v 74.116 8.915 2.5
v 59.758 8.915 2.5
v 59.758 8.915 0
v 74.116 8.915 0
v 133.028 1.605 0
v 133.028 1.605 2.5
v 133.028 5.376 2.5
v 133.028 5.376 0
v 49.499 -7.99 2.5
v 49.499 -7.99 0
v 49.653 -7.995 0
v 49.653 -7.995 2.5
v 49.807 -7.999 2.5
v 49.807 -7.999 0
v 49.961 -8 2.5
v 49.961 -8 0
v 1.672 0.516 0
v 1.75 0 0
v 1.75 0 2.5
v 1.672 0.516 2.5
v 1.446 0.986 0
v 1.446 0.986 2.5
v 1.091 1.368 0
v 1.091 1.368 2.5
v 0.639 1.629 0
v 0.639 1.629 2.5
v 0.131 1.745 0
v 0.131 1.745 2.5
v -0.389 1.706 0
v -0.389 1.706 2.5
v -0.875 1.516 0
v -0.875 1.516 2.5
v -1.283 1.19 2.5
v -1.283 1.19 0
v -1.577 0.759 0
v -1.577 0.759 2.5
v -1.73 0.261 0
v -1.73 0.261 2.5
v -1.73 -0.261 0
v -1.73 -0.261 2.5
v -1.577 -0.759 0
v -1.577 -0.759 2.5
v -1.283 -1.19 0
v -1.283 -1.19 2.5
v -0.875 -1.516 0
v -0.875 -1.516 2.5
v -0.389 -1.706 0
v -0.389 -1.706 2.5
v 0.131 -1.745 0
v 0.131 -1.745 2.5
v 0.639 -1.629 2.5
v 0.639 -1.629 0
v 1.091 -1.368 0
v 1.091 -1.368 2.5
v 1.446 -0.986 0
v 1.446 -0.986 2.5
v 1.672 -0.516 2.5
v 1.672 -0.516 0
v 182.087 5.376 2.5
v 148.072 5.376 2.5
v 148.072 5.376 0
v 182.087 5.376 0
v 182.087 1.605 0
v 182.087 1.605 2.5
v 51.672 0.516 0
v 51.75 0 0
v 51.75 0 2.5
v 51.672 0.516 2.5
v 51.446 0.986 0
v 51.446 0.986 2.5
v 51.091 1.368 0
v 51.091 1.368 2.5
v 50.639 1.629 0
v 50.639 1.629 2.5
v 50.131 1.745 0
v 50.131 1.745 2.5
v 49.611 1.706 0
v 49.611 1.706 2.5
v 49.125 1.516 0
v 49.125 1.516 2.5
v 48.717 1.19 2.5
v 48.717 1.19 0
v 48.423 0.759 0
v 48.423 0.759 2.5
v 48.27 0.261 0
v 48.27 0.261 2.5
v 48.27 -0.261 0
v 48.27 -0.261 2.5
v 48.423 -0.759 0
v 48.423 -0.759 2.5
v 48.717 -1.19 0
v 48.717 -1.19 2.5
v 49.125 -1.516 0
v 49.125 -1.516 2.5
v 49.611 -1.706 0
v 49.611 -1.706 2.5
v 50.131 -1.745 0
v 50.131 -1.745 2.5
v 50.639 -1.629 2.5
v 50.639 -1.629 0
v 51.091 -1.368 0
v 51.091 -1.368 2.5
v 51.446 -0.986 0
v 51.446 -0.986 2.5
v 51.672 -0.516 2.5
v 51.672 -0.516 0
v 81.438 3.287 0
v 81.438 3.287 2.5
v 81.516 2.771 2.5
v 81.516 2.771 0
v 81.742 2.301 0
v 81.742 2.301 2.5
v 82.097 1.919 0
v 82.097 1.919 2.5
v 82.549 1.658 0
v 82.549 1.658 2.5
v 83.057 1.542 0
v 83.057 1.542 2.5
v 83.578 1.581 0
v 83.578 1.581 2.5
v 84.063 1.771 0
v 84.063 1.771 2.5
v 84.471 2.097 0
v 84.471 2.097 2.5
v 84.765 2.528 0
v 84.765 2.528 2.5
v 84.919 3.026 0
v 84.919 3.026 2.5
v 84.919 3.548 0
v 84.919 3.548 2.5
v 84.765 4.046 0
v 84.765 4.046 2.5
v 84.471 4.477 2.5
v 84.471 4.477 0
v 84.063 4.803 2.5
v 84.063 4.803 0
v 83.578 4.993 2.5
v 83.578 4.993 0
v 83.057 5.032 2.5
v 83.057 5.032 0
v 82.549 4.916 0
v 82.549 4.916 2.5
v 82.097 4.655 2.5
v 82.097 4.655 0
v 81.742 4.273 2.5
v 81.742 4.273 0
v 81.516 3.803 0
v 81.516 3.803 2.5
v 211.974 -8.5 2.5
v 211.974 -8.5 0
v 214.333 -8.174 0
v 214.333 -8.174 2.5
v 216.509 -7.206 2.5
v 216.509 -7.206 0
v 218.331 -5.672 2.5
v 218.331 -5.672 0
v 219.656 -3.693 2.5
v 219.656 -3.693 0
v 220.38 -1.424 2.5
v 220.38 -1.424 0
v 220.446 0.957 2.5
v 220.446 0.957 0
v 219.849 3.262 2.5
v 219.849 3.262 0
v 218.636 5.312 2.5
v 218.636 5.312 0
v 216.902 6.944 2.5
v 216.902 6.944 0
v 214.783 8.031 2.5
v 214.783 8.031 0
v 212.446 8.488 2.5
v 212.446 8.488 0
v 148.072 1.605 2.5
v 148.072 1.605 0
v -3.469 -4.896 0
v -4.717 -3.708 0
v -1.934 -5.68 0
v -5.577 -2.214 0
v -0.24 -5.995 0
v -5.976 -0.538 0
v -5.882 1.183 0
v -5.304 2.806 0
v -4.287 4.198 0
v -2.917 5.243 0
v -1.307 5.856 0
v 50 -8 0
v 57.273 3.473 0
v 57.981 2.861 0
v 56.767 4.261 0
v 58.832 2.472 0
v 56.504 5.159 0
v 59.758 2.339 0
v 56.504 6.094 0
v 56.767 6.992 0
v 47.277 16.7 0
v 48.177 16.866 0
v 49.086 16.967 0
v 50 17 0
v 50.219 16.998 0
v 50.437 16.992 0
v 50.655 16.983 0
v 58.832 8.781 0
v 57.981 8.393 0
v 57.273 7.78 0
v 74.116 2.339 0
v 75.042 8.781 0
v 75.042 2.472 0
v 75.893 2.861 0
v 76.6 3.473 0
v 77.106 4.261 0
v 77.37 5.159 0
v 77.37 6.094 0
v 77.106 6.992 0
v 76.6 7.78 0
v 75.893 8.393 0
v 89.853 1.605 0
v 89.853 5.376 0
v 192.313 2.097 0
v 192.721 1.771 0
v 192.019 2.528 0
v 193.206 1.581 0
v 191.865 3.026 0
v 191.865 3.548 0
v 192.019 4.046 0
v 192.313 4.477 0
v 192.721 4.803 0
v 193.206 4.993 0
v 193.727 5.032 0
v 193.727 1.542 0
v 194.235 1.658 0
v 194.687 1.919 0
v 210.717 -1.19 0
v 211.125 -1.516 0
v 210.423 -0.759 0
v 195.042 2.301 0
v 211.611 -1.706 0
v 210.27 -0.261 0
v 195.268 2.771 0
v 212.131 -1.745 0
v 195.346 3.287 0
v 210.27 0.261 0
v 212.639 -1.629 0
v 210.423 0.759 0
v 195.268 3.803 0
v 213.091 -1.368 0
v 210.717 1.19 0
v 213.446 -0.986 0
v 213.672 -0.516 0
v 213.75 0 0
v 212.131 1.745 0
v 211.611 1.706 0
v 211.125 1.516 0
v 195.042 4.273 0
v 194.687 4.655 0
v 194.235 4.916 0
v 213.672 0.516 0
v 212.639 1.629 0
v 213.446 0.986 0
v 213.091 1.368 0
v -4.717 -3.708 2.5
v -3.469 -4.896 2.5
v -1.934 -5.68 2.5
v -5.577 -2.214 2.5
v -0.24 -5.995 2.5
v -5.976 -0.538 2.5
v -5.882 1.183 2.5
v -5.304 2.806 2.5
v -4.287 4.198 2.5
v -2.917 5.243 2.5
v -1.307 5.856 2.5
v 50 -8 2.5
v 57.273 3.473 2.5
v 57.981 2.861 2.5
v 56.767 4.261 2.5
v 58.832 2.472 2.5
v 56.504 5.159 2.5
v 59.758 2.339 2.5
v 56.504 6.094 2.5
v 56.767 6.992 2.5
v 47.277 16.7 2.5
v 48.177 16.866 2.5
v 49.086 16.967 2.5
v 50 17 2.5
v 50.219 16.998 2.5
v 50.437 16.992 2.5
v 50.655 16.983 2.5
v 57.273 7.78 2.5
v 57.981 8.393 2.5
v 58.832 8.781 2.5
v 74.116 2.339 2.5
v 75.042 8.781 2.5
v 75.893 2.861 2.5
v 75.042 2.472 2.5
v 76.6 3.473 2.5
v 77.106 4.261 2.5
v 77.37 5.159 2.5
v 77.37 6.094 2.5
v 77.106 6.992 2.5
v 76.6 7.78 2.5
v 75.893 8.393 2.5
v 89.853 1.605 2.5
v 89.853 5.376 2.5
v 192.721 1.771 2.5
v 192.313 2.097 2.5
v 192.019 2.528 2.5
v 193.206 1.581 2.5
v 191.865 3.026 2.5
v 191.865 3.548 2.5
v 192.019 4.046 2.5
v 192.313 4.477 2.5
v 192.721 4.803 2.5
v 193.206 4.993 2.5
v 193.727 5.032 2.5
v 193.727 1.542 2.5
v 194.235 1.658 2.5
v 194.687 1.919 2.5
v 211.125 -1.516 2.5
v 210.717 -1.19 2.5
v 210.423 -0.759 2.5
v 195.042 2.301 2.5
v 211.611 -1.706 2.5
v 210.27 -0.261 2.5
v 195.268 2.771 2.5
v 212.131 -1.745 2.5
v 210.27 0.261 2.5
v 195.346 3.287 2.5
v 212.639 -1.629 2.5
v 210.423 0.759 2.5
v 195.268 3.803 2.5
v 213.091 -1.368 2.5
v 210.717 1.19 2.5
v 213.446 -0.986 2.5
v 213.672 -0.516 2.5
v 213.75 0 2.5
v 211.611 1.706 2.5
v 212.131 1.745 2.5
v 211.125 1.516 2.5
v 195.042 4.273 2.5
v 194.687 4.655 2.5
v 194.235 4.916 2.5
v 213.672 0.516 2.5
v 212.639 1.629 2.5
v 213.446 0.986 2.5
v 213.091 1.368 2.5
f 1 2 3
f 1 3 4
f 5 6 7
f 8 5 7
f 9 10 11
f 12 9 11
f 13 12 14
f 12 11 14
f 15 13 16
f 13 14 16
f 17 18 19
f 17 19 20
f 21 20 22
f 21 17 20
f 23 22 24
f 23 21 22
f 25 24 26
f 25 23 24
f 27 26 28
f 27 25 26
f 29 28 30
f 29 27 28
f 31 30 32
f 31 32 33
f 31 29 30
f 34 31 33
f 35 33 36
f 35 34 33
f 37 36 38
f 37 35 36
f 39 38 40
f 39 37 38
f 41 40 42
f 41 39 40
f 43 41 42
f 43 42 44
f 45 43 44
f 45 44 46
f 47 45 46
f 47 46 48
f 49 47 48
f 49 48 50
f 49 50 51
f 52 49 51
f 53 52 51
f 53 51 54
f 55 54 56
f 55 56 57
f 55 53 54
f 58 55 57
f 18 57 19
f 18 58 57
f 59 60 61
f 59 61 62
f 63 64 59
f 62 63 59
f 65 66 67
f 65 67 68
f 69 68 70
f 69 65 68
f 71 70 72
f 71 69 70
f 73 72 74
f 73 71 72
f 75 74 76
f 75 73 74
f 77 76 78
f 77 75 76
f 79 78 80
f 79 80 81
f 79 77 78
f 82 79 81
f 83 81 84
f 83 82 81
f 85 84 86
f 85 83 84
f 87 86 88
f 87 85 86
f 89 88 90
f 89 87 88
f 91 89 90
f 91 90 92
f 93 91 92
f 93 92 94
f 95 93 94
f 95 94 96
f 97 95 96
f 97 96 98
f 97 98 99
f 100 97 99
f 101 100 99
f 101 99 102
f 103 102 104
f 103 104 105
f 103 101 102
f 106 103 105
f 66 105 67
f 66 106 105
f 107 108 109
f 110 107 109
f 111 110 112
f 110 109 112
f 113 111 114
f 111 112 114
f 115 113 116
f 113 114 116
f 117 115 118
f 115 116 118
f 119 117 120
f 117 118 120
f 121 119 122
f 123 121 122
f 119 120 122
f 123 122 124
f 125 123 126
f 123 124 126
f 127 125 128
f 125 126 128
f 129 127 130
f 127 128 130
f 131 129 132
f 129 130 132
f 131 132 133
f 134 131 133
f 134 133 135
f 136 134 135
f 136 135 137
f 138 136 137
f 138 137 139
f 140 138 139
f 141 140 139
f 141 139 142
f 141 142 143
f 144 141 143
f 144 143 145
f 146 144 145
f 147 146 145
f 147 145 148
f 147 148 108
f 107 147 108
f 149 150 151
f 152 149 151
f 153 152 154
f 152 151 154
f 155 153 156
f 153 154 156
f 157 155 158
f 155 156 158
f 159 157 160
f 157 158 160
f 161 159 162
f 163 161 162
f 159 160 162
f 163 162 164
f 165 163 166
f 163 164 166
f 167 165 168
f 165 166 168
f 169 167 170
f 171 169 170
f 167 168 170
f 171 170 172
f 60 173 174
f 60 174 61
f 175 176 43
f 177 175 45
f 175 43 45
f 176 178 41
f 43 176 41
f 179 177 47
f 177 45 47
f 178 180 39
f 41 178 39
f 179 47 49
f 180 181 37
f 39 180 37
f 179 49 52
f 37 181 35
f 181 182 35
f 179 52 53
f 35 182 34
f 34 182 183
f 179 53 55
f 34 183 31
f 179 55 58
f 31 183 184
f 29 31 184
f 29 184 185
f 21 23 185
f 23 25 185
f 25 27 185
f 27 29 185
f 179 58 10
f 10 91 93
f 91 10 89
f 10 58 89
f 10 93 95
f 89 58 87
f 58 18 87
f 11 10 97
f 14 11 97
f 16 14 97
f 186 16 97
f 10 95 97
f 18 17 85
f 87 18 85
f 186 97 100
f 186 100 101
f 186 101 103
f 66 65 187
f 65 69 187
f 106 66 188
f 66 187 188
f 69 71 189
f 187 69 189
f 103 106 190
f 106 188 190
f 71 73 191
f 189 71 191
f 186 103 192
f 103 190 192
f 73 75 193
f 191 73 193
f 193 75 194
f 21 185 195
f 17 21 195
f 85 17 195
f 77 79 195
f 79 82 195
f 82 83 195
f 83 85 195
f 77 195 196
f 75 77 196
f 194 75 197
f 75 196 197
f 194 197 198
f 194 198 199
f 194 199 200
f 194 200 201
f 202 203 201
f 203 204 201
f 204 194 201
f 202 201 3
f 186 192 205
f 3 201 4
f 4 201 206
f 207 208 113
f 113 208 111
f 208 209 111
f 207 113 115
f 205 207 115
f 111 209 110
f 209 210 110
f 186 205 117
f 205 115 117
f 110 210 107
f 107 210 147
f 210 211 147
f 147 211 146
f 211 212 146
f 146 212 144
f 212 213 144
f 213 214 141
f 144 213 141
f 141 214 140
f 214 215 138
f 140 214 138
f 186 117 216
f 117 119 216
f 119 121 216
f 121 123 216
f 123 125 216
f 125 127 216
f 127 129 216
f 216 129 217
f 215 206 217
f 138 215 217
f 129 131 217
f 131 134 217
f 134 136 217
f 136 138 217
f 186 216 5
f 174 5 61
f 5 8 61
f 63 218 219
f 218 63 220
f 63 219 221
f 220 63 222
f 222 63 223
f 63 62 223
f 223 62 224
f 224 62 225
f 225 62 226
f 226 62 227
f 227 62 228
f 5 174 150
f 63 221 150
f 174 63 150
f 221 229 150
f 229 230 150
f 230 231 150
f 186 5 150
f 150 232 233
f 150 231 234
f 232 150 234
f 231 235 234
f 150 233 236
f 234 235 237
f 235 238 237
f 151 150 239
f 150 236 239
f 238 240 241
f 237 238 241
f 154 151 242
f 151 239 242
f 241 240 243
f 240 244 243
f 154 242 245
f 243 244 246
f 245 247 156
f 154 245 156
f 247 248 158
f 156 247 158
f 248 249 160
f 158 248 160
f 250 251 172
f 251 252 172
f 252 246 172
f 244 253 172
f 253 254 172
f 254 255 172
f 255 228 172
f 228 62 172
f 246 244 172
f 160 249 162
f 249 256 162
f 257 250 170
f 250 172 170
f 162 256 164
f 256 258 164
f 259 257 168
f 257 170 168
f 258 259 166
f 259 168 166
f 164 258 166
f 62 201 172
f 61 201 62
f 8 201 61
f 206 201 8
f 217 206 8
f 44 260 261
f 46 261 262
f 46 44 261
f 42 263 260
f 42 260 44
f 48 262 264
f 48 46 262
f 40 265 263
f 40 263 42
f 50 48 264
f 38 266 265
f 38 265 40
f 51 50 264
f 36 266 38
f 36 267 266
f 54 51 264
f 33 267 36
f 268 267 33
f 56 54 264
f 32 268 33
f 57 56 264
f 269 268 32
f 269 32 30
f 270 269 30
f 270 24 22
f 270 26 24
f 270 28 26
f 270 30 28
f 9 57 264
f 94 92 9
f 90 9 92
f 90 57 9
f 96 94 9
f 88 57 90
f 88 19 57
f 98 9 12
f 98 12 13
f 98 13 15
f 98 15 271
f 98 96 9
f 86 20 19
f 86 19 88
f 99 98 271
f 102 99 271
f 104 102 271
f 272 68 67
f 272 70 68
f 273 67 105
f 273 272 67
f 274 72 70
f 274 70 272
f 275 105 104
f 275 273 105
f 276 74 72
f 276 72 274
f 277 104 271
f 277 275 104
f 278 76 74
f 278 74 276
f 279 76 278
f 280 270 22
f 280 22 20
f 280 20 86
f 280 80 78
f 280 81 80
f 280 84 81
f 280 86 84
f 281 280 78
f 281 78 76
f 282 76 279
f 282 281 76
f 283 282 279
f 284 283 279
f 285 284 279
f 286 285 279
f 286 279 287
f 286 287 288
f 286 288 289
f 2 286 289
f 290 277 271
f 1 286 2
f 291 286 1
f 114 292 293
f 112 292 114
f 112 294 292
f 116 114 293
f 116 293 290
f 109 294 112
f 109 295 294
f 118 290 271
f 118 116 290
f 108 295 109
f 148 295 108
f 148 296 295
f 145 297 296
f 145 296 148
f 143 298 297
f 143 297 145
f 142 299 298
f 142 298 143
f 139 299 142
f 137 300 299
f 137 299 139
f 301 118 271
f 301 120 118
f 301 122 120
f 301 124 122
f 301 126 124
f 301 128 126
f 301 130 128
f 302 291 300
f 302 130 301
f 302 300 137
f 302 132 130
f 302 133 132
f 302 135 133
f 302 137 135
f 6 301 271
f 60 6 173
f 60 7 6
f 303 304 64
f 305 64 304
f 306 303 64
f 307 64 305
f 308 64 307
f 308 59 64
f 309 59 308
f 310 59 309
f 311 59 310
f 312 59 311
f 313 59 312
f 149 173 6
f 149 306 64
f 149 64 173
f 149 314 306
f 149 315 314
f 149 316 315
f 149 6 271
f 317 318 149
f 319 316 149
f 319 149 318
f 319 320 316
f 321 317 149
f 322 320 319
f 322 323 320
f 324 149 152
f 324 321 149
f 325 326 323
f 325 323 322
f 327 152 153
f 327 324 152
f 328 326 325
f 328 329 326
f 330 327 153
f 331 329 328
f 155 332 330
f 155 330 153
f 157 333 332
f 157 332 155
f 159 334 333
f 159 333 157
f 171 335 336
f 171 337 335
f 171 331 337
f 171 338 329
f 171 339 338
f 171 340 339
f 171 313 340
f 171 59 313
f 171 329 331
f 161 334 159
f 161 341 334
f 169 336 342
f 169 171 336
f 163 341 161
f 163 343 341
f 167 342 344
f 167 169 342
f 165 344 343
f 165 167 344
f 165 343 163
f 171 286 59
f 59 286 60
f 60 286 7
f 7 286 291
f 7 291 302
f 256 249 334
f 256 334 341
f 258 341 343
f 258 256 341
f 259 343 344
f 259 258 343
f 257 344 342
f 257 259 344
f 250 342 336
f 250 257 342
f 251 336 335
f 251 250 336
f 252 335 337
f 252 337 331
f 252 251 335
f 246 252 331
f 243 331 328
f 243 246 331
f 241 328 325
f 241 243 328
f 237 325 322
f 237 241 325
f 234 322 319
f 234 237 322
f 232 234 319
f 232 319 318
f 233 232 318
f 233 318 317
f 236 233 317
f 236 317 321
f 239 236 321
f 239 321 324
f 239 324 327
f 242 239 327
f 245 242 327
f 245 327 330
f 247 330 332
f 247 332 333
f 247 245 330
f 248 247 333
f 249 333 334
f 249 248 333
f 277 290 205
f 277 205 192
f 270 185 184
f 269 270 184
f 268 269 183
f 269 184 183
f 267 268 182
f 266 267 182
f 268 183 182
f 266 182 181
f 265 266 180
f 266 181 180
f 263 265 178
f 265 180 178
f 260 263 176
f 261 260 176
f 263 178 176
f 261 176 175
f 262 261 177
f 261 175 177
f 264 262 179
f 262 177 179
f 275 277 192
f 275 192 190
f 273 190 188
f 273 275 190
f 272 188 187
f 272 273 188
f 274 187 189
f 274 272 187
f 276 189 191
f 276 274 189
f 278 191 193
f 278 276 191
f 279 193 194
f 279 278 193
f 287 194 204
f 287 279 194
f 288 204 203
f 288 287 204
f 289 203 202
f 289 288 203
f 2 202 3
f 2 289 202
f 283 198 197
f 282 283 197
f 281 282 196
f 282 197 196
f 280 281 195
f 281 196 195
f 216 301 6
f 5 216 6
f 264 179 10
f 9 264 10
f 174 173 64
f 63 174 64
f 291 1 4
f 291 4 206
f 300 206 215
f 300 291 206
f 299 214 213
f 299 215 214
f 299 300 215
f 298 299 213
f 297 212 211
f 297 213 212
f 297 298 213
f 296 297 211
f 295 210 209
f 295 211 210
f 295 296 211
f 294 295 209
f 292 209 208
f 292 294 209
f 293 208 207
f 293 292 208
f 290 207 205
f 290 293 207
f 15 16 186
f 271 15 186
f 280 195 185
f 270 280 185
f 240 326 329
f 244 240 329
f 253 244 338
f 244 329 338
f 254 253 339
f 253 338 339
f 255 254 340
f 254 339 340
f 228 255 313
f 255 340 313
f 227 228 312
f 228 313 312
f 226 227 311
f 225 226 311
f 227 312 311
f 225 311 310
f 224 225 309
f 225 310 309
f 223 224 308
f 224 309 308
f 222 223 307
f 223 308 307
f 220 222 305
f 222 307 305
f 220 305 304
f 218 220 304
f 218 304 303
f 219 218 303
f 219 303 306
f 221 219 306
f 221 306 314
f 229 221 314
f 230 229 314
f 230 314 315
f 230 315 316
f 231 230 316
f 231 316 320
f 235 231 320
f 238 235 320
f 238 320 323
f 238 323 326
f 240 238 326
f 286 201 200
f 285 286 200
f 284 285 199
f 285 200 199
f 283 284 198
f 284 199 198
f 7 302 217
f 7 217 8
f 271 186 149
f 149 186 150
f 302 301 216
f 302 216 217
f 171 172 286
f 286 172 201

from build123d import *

# Parameters (mm, degrees)
SKETCH_1_R          = 1.75
EXTRUDE_2_DEPTH     = 2.5
SKETCH_2_W          = 43.174936718
SKETCH_2_H          = 3.770638763
SKETCH_2_W_2        = 34.014564127
CUT_EXTRUDE_1_DEPTH = 3.5
SKETCH_3_R          = 1.75
CUT_EXTRUDE_2_DEPTH = 3.5


with BuildPart() as part:
    # 草图1 → 凸台-拉伸2 (new body)
    with BuildSketch(Plane.XY):
        with BuildLine():
            ThreePointArc((-1.307031792, 5.855908802), (-5.975846633, -0.537826197), (-0.240433737, -5.995180699))
            Line((-0.240433737, -5.995180699), (49.499096381, -7.98995979))
            ThreePointArc((49.499096381, -7.98995979), (49.730212736, -7.997088254), (49.961421407, -7.999940468))
            Line((49.961421407, -7.999940468), (49.999999816, -8.000059532))
            Line((49.999999816, -8.000059532), (211.973766557, -8.499959518))
            ThreePointArc((211.973766557, -8.499959518), (220.496722576, -0.236020072), (212.445662896, 8.4883087))
            Line((212.445662896, 8.4883087), (50.655386612, 16.982806911))
            ThreePointArc((50.655386612, 16.982806911), (50.327806045, 16.995700989), (50, 17))
            ThreePointArc((50, 17), (48.630260069, 16.924725853), (47.2770171, 16.699810004))
            Line((47.2770171, 16.699810004), (-1.307031792, 5.855908802))
        make_face()
        Circle(SKETCH_1_R, mode=Mode.SUBTRACT)
        with Locations((50, 0)):
            Circle(SKETCH_1_R, mode=Mode.SUBTRACT)
        with Locations((212, 0)):
            Circle(SKETCH_1_R, mode=Mode.SUBTRACT)
    extrude(amount=EXTRUDE_2_DEPTH)

    # 草图2 → 切除-拉伸1 (cut, through all)
    with BuildSketch(Plane.XY.offset(2.5)):
        with BuildLine():
            Line((59.758236221, 8.91451918), (74.115618559, 8.91451918))
            ThreePointArc((74.115618559, 8.91451918), (77.403568713, 5.626569026), (74.115618559, 2.338618872))
            Line((74.115618559, 2.338618872), (59.758236221, 2.338618872))
            ThreePointArc((59.758236221, 2.338618872), (56.470286067, 5.626569026), (59.758236221, 8.91451918))
        make_face()
        with Locations((111.440293999, 3.490211277)):
            Rectangle(SKETCH_2_W, SKETCH_2_H)
        with Locations((165.07921871, 3.490211277)):
            Rectangle(SKETCH_2_W_2, SKETCH_2_H)
    extrude(amount=-CUT_EXTRUDE_1_DEPTH, mode=Mode.SUBTRACT)

    # 草图3 → 切除-拉伸2 (cut, through all)
    with BuildSketch(Plane.XY.offset(2.5)):
        with BuildLine():
            ThreePointArc((84.93827664, 3.287023225), (83.18827664, 5.037023225), (81.43827664, 3.287023225))
            Line((81.43827664, 3.287023225), (84.93827664, 3.287023225))
        make_face()
        with BuildLine():
            Line((84.93827664, 3.287023225), (81.43827664, 3.287023225))
            ThreePointArc((81.43827664, 3.287023225), (83.18827664, 1.537023225), (84.93827664, 3.287023225))
        make_face()
        with Locations((193.595777353, 3.287023225)):
            Circle(SKETCH_3_R)
    extrude(amount=-CUT_EXTRUDE_2_DEPTH, mode=Mode.SUBTRACT)


solid = part.part
